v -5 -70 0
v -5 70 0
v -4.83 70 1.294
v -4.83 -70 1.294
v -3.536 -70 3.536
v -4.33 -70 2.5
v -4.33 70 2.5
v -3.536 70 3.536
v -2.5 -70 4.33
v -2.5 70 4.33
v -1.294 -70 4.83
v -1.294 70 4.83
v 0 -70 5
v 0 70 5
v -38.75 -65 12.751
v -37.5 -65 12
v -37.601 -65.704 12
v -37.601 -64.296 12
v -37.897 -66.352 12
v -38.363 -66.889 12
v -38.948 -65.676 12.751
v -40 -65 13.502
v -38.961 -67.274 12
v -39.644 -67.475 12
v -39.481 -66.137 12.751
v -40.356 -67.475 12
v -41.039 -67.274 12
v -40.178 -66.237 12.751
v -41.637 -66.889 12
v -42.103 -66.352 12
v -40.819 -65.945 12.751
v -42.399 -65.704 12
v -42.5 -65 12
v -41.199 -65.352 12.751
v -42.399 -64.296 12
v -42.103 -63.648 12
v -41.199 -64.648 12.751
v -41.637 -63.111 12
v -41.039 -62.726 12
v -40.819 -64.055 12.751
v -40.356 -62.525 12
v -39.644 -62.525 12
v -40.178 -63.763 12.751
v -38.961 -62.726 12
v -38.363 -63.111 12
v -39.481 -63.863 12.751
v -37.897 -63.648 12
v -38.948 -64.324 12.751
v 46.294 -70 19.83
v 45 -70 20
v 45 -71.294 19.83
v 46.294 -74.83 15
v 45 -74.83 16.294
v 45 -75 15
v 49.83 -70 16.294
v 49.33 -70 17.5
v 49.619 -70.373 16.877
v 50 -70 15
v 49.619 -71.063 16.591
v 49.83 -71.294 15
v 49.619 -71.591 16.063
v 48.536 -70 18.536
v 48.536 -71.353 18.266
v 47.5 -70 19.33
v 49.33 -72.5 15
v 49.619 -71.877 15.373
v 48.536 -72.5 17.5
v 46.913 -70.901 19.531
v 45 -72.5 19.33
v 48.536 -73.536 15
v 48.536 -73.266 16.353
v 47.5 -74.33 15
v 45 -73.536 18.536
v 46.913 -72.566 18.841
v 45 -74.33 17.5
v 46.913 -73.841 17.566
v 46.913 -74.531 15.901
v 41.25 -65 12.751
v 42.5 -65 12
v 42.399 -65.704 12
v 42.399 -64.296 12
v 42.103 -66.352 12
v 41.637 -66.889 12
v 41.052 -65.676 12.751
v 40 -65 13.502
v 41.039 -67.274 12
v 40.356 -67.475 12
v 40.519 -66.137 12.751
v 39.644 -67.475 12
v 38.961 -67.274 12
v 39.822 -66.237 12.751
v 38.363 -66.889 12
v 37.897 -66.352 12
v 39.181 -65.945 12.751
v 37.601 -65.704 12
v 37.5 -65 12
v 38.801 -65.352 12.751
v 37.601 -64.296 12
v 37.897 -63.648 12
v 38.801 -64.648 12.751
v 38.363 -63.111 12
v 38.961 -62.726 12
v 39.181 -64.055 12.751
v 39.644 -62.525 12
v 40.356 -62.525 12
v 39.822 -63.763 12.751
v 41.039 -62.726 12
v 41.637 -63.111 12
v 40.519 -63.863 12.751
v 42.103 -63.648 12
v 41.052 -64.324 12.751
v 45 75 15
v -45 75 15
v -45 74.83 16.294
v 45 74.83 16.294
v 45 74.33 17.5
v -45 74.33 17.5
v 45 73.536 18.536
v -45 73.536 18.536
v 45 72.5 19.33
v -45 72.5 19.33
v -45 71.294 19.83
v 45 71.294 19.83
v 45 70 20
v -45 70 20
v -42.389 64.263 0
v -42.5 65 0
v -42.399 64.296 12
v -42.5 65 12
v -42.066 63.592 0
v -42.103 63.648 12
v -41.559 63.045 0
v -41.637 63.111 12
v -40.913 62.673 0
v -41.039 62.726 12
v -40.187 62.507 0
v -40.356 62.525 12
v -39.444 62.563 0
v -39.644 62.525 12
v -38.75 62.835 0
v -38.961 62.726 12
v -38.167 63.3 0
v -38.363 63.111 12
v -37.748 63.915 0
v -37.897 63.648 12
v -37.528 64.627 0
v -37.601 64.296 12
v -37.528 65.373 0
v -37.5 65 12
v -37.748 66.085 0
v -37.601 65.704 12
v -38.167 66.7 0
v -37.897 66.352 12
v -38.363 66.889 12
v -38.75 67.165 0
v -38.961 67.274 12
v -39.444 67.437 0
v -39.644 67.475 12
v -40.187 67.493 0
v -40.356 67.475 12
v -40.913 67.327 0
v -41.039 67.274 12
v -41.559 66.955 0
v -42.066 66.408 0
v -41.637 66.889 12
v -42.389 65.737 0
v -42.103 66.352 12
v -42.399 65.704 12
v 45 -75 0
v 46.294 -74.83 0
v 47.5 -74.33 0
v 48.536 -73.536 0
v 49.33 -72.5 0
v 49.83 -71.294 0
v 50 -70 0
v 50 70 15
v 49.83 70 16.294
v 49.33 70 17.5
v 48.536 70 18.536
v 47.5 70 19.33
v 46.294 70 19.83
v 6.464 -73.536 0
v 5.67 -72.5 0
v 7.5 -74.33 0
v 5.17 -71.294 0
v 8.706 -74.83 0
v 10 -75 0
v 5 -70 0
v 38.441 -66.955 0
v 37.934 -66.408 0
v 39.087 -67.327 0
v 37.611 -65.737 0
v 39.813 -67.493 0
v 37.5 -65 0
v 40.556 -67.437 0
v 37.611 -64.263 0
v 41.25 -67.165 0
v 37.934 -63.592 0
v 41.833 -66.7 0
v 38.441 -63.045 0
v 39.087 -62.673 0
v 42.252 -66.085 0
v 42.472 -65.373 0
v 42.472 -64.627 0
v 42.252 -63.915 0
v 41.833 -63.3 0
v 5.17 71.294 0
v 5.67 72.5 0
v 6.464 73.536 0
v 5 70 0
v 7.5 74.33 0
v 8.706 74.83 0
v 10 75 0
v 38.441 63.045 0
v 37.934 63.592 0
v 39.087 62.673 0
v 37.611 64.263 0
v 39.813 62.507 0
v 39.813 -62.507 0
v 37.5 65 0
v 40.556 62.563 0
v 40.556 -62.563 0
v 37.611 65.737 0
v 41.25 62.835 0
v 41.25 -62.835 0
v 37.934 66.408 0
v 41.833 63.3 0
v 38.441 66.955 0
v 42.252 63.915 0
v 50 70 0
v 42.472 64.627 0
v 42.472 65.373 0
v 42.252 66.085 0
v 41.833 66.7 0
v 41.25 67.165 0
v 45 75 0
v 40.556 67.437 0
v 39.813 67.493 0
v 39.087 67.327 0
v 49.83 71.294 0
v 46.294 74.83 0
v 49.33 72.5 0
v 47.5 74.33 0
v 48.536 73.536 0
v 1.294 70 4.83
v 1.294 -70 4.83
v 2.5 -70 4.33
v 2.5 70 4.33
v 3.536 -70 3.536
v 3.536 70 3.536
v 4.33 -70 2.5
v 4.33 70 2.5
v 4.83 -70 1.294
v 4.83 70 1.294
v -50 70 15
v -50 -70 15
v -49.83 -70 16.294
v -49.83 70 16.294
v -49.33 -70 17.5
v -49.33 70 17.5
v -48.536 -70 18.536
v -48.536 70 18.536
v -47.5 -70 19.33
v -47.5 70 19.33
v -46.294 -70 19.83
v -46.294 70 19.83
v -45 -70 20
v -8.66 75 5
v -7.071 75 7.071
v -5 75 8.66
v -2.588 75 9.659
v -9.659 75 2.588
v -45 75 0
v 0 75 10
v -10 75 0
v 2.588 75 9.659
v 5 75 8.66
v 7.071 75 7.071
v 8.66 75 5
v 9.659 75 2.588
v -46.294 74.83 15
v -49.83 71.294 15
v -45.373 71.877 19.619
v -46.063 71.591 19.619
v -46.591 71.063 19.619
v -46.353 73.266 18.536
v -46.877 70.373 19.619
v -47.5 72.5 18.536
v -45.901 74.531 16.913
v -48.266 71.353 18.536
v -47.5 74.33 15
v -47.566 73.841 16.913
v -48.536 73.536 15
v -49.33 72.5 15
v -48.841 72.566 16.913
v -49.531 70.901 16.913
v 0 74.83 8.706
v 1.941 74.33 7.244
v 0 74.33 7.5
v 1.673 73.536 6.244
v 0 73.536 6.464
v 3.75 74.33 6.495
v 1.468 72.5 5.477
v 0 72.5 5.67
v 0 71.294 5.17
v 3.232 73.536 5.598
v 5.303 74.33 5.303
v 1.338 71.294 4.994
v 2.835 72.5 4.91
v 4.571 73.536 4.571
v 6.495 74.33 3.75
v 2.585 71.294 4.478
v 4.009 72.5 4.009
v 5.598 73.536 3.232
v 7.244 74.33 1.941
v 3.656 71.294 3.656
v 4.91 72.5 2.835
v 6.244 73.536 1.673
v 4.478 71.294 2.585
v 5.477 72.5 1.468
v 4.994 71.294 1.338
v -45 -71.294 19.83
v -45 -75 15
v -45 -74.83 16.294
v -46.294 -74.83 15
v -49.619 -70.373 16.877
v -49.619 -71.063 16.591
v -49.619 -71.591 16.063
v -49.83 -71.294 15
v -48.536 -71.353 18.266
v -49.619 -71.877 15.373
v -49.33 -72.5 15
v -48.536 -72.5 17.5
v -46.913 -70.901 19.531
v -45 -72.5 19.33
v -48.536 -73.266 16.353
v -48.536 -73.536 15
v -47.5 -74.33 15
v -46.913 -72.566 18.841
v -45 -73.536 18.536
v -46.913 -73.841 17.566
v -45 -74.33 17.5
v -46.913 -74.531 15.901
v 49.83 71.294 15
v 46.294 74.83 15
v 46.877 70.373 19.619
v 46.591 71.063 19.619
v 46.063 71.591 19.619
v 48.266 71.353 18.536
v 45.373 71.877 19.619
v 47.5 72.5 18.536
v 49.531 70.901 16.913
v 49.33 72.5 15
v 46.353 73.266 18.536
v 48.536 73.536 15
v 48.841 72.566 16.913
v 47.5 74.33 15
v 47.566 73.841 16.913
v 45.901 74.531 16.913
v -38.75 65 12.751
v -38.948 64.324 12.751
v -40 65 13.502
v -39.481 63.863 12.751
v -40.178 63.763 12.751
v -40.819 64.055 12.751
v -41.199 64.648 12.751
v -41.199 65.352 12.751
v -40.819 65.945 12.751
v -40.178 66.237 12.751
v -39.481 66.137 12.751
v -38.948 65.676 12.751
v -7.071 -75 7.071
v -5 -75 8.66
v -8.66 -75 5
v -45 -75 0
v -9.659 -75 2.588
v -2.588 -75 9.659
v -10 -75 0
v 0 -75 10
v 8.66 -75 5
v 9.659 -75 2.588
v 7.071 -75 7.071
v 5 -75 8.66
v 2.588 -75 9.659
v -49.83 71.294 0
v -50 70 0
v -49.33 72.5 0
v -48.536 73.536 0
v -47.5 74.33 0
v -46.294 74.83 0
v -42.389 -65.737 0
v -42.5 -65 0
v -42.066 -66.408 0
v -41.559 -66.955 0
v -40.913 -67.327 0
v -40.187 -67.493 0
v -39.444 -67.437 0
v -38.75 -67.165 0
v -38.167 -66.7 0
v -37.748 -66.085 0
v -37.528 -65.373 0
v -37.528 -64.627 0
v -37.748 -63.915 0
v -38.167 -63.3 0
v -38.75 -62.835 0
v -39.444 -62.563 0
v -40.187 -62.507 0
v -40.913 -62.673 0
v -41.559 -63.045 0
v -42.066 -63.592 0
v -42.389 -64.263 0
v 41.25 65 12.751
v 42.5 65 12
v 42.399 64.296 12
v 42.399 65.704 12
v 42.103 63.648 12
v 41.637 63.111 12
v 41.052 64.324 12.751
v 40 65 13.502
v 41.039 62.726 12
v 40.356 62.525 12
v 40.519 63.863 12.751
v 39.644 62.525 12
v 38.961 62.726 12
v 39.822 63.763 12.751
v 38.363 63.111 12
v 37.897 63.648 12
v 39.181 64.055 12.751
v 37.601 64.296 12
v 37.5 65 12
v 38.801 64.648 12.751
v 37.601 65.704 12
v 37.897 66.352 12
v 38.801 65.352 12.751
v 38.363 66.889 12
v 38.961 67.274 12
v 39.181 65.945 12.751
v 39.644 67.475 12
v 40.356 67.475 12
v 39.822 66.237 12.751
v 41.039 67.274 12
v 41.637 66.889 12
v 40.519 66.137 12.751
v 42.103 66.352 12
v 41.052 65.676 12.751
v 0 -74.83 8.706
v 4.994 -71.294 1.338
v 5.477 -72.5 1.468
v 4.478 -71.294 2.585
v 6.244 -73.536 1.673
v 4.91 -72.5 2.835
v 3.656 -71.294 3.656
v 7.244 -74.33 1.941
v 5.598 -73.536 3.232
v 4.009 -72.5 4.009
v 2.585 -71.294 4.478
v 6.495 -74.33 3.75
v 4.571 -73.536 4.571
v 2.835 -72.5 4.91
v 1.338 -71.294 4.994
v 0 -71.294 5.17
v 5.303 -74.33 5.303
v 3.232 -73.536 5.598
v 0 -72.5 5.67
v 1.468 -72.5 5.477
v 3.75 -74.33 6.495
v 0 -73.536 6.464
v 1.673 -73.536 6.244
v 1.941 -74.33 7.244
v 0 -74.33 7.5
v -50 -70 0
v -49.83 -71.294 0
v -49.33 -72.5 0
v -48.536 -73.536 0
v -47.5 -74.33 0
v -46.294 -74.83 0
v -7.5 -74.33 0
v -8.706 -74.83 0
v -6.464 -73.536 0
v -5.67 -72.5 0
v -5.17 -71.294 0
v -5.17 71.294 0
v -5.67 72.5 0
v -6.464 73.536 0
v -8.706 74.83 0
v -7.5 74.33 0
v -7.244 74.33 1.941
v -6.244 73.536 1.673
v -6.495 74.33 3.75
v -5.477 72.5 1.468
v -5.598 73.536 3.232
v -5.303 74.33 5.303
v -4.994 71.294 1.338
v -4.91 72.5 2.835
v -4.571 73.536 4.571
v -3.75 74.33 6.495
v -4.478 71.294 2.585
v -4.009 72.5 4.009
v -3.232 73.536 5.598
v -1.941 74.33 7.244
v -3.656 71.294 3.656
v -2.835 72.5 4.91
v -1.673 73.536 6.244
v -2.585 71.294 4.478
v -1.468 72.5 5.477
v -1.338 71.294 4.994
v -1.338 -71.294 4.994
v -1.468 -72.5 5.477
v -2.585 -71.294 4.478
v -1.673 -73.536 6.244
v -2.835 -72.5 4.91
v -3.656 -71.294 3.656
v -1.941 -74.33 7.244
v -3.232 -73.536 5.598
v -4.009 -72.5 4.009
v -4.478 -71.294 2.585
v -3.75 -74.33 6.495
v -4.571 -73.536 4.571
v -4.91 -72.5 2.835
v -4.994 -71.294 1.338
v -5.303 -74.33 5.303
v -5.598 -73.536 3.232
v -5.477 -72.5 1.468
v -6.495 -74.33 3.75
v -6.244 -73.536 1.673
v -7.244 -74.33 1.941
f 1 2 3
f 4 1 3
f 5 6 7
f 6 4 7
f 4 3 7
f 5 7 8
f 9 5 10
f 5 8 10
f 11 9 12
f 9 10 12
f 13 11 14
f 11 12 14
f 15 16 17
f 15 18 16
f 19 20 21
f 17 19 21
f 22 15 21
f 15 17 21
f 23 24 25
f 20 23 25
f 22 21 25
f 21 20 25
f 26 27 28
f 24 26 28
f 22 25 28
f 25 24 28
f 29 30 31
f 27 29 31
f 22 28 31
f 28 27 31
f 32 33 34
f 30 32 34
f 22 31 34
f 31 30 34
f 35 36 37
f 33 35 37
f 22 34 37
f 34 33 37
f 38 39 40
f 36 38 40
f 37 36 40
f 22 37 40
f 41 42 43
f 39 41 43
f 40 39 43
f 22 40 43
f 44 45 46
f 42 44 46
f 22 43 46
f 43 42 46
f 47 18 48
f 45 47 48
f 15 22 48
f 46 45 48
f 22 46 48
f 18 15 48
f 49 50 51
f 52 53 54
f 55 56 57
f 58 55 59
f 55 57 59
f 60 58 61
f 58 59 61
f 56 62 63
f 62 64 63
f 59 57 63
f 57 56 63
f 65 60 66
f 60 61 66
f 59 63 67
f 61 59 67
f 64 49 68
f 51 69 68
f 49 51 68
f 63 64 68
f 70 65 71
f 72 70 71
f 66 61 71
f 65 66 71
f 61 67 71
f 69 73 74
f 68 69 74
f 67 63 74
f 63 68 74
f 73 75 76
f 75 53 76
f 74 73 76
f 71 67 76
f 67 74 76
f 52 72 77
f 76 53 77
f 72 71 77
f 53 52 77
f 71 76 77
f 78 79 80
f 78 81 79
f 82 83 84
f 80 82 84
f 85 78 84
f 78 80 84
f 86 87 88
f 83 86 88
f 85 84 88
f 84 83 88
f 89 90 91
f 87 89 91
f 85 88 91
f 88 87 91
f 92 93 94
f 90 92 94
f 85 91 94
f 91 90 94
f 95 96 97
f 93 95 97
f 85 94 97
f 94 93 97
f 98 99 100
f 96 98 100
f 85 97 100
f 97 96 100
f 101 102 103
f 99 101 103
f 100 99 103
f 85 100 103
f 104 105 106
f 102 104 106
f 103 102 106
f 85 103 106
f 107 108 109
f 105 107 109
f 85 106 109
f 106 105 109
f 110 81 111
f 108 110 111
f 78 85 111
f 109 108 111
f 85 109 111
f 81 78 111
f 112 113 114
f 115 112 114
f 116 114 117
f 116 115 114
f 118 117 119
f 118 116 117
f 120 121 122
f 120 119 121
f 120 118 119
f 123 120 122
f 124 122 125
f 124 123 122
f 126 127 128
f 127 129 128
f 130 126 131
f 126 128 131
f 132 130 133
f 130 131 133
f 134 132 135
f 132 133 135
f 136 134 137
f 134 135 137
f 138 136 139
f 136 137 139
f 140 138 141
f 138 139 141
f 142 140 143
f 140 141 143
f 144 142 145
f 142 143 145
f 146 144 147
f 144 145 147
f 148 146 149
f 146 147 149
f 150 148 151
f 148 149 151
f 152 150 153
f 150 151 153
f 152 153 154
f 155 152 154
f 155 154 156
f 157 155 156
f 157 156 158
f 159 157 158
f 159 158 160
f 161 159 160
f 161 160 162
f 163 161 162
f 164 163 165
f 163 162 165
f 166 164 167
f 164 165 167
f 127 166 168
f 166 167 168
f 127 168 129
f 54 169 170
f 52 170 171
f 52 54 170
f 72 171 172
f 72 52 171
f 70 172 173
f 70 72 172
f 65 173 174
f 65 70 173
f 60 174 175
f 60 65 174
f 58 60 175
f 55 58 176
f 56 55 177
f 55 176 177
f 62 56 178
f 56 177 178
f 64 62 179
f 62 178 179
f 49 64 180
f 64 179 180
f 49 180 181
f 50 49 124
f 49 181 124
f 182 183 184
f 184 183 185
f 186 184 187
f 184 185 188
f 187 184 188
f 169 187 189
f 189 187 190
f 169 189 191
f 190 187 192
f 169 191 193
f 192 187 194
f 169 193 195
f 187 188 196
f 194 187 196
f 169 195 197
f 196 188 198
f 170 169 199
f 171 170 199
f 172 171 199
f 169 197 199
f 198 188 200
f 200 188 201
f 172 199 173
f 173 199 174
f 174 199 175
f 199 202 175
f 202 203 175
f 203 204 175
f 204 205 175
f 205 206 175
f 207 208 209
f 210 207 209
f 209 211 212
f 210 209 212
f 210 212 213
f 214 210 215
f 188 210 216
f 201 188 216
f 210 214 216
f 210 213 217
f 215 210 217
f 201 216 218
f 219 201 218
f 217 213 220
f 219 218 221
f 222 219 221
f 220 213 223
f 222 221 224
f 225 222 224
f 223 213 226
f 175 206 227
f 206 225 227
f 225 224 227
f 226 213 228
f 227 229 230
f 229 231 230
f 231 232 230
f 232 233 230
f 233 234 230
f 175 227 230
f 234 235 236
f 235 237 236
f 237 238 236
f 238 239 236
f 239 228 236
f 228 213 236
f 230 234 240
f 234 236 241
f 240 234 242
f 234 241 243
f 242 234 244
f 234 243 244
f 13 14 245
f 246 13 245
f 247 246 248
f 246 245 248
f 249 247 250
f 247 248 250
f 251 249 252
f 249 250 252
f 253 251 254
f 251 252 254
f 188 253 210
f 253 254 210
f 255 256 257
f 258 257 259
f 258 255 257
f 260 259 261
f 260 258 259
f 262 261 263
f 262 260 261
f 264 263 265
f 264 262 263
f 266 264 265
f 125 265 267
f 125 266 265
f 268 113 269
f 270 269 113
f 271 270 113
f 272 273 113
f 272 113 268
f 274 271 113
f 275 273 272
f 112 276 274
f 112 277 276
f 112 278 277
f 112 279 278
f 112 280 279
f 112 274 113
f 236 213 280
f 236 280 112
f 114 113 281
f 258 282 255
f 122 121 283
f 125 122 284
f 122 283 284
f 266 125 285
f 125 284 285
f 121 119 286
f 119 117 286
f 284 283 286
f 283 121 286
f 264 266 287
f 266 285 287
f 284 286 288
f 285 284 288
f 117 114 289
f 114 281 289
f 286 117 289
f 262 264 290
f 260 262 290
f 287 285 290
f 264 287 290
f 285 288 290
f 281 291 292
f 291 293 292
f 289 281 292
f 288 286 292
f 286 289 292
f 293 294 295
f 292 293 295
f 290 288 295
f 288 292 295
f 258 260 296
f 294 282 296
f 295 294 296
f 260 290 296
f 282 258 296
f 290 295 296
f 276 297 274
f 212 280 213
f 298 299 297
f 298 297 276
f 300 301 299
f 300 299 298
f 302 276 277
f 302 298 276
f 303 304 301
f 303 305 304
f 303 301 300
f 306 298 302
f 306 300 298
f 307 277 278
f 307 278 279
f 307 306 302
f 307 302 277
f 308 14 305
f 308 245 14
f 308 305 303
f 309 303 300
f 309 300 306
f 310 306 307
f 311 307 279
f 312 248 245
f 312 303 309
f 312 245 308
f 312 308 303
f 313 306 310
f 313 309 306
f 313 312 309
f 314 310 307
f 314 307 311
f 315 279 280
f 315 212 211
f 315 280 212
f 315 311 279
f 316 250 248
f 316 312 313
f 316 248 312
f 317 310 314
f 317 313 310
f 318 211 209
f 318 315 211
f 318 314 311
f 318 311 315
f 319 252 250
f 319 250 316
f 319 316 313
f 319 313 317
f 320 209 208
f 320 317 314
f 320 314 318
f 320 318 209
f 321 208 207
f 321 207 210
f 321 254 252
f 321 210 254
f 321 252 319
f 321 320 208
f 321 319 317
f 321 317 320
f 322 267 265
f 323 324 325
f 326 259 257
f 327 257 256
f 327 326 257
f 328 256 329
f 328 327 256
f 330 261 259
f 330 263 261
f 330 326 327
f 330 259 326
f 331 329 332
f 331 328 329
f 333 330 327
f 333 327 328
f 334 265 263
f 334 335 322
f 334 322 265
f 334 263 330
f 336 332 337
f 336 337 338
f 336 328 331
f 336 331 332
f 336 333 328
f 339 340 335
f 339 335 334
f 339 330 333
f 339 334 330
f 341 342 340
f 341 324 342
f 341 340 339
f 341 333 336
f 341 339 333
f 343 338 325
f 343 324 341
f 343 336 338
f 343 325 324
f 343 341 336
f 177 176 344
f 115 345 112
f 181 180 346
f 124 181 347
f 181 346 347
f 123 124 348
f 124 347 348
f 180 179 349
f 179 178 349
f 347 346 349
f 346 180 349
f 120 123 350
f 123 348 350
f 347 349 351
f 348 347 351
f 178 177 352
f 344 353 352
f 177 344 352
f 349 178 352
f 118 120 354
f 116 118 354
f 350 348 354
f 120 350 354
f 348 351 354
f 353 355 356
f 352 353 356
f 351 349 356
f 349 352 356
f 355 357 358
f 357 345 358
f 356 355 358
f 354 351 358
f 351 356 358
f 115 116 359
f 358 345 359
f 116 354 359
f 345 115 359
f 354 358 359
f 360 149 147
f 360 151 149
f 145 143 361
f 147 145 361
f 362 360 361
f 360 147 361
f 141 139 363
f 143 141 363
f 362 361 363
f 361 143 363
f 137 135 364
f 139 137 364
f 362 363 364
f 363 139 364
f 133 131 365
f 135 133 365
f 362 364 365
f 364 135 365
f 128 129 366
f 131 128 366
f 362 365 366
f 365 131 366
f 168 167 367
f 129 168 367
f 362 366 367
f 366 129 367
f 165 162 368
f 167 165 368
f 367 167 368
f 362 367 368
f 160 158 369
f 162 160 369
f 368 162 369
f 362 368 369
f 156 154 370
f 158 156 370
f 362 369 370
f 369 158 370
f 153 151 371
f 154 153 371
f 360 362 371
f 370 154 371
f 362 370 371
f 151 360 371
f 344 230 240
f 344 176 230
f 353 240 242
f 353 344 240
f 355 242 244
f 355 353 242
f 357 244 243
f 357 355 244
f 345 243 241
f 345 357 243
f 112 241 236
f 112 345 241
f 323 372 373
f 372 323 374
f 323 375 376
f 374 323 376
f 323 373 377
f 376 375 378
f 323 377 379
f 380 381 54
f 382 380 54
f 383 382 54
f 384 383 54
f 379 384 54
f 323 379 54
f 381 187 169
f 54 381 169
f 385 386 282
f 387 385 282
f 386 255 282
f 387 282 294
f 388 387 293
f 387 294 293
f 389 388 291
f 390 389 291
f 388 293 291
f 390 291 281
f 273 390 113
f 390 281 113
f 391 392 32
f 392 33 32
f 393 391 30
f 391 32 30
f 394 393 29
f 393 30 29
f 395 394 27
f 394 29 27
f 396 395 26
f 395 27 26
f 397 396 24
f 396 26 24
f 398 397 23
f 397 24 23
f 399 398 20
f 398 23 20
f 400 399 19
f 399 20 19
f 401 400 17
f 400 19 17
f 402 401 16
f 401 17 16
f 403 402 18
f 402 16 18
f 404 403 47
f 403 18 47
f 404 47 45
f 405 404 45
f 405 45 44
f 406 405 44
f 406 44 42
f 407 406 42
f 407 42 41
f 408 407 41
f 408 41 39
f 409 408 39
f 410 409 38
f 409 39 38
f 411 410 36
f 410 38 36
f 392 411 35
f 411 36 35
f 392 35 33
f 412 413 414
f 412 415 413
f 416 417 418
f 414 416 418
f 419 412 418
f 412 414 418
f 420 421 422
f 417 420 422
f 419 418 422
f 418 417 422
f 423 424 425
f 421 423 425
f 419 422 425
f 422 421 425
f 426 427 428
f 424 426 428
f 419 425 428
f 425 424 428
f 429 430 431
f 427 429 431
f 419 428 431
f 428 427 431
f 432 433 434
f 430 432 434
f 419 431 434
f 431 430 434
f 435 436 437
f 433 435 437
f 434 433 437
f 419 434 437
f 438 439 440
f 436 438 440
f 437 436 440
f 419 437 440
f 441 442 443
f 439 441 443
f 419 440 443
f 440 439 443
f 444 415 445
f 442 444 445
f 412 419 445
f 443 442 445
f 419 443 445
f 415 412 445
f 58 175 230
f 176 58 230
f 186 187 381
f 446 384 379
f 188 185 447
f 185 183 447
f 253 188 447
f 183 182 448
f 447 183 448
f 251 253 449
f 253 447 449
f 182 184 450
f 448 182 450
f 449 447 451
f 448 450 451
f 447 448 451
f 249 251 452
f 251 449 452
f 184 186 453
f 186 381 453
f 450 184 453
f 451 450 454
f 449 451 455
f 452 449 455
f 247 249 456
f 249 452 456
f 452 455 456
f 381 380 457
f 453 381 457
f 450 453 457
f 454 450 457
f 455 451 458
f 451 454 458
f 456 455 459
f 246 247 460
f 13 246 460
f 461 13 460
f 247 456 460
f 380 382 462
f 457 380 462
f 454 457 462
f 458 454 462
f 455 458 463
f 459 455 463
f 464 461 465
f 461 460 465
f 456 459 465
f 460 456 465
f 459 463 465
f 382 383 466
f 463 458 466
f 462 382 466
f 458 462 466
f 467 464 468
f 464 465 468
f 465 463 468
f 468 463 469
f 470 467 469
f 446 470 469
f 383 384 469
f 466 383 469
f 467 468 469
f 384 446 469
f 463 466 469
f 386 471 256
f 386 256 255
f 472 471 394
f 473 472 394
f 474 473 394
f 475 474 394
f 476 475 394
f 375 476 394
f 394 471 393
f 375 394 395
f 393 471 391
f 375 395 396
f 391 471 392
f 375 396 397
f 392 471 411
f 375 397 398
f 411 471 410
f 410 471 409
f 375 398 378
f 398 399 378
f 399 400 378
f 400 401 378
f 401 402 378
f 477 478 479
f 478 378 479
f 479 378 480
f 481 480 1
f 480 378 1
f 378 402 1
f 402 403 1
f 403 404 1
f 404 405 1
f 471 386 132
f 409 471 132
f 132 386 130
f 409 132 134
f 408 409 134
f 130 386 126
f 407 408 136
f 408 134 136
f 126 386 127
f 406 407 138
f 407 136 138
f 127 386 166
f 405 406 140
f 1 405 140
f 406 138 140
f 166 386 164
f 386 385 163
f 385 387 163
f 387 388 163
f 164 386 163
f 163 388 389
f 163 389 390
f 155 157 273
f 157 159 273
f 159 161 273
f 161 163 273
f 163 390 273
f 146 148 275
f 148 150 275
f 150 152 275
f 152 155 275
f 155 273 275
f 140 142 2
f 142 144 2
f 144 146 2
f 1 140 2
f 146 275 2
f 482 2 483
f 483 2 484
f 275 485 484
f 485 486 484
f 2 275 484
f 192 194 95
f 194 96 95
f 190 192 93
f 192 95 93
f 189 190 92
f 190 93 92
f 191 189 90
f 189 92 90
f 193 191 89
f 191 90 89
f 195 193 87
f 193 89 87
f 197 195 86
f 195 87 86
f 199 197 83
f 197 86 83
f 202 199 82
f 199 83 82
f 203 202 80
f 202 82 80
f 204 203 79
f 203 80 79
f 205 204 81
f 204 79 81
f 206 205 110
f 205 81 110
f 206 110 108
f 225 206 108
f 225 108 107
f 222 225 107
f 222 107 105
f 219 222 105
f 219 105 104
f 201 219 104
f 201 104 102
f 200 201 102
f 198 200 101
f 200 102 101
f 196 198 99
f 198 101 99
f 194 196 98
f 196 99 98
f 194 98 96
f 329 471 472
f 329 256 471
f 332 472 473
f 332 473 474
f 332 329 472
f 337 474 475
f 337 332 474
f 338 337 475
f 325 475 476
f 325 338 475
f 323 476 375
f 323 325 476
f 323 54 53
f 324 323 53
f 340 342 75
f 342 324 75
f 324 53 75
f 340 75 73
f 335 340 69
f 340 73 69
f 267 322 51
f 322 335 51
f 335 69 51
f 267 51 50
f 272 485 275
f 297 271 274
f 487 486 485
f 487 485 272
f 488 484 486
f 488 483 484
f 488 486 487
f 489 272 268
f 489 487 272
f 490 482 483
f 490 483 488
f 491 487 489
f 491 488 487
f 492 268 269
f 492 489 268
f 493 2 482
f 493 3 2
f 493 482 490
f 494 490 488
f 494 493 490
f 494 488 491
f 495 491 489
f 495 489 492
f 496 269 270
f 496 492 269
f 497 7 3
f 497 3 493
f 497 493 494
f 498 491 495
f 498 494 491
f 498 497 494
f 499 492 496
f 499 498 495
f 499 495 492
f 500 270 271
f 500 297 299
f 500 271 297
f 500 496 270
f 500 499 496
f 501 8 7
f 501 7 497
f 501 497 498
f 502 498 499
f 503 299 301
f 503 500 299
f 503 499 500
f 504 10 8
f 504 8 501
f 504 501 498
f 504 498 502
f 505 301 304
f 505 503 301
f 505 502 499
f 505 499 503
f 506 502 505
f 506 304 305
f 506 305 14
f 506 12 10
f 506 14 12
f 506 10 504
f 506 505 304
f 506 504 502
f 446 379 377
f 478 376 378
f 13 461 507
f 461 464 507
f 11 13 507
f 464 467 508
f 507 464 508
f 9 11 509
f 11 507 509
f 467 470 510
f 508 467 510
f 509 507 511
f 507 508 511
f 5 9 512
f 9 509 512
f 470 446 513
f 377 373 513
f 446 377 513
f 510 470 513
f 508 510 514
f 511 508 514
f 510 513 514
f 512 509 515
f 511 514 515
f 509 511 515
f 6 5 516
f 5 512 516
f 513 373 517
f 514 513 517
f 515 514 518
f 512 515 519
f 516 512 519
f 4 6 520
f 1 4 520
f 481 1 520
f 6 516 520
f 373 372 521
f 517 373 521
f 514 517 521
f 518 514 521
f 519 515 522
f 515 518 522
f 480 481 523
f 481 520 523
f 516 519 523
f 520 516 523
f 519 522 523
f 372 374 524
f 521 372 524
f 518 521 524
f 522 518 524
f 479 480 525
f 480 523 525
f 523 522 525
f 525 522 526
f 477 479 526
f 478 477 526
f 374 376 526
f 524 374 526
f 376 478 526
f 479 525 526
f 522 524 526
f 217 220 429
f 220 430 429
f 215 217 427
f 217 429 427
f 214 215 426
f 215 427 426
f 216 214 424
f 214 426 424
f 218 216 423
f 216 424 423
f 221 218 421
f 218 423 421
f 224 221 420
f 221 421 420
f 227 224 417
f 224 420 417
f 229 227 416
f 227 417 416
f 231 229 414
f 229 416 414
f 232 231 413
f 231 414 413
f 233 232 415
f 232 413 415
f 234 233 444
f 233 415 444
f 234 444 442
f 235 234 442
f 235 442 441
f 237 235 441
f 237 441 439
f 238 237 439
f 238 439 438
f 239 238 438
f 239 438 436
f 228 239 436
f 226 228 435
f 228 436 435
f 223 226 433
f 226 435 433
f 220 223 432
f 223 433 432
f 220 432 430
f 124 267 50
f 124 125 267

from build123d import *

# Parameters (mm, degrees)
F0_W     = 100
F0_H     = 150
F1_DEPTH = 20
F2_R     = 5
F3_D     = 5
F3_DEPTH = 12
F3_TIP   = 1.5021515476
F4_W     = 10
F4_H     = 150
F5_DEPTH = 5
F6_F1_R  = 4.9999
F6_F2_R  = 5


# Not quite as in the source:
# - a fillet or chamfer is up to 0.001 mm smaller than in the source, because OpenCascade refuses the exact size


with BuildPart() as f1:
    # F0 (on Top) → F1 (new body)
    with BuildSketch(Plane.XY):
        Rectangle(F0_W, F0_H)
    extrude(amount=F1_DEPTH)

    # F2
    f2_edges = [f1.edges().sort_by_distance(p)[0] for p in [
        (-50, 75, 10),
        (50, 75, 10),
        (0, -75, 20),
        (50, 0, 20),
        (0, 75, 20),
        (-50, 0, 20),
        (50, -75, 10),
        (-50, -75, 10),
    ]]
    fillet(f2_edges, radius=F2_R)

    # F3
    with Locations(Plane(origin=(0, 0, 0), x_dir=(1, 0, 0), z_dir=(0, 0, -1))):
        with Locations((40, -65), (-40, -65), (40, 65), (-40, 65)):
            Hole(F3_D / 2, depth=F3_DEPTH)
            with Locations((0, 0, -(F3_DEPTH + F3_TIP / 2))):  # 118° drill point
                Cone(0, F3_D / 2, F3_TIP, mode=Mode.SUBTRACT)

    # F4 (on face) → F5 (cut)
    with BuildSketch(Plane.XY):
        Rectangle(F4_W, F4_H)
    extrude(amount=F5_DEPTH, mode=Mode.SUBTRACT)

    # F6: fillet of radius 5 on 4 edges, made by hand

    # F6_f1 (radius 5 in the source; OpenCascade refuses exactly that, so slightly less here)
    f6_f1_edges = [f1.edges().sort_by_distance(p)[0] for p in [
        (5, 0, 5),
        (-5, 0, 5),
    ]]
    fillet(f6_f1_edges, radius=F6_F1_R)

    # F6_f2
    f6_f2_edges = [f1.edges().sort_by_distance(p)[0] for p in [
        (5, -75, 5e-05),
        (-5, 75, 5e-05),
        (-3.5355631953, 75, 3.5355631953),
        (3.5355631953, -75, 3.5355631953),
    ]]
    fillet(f6_f2_edges, radius=F6_F2_R)


solid = f1.part
